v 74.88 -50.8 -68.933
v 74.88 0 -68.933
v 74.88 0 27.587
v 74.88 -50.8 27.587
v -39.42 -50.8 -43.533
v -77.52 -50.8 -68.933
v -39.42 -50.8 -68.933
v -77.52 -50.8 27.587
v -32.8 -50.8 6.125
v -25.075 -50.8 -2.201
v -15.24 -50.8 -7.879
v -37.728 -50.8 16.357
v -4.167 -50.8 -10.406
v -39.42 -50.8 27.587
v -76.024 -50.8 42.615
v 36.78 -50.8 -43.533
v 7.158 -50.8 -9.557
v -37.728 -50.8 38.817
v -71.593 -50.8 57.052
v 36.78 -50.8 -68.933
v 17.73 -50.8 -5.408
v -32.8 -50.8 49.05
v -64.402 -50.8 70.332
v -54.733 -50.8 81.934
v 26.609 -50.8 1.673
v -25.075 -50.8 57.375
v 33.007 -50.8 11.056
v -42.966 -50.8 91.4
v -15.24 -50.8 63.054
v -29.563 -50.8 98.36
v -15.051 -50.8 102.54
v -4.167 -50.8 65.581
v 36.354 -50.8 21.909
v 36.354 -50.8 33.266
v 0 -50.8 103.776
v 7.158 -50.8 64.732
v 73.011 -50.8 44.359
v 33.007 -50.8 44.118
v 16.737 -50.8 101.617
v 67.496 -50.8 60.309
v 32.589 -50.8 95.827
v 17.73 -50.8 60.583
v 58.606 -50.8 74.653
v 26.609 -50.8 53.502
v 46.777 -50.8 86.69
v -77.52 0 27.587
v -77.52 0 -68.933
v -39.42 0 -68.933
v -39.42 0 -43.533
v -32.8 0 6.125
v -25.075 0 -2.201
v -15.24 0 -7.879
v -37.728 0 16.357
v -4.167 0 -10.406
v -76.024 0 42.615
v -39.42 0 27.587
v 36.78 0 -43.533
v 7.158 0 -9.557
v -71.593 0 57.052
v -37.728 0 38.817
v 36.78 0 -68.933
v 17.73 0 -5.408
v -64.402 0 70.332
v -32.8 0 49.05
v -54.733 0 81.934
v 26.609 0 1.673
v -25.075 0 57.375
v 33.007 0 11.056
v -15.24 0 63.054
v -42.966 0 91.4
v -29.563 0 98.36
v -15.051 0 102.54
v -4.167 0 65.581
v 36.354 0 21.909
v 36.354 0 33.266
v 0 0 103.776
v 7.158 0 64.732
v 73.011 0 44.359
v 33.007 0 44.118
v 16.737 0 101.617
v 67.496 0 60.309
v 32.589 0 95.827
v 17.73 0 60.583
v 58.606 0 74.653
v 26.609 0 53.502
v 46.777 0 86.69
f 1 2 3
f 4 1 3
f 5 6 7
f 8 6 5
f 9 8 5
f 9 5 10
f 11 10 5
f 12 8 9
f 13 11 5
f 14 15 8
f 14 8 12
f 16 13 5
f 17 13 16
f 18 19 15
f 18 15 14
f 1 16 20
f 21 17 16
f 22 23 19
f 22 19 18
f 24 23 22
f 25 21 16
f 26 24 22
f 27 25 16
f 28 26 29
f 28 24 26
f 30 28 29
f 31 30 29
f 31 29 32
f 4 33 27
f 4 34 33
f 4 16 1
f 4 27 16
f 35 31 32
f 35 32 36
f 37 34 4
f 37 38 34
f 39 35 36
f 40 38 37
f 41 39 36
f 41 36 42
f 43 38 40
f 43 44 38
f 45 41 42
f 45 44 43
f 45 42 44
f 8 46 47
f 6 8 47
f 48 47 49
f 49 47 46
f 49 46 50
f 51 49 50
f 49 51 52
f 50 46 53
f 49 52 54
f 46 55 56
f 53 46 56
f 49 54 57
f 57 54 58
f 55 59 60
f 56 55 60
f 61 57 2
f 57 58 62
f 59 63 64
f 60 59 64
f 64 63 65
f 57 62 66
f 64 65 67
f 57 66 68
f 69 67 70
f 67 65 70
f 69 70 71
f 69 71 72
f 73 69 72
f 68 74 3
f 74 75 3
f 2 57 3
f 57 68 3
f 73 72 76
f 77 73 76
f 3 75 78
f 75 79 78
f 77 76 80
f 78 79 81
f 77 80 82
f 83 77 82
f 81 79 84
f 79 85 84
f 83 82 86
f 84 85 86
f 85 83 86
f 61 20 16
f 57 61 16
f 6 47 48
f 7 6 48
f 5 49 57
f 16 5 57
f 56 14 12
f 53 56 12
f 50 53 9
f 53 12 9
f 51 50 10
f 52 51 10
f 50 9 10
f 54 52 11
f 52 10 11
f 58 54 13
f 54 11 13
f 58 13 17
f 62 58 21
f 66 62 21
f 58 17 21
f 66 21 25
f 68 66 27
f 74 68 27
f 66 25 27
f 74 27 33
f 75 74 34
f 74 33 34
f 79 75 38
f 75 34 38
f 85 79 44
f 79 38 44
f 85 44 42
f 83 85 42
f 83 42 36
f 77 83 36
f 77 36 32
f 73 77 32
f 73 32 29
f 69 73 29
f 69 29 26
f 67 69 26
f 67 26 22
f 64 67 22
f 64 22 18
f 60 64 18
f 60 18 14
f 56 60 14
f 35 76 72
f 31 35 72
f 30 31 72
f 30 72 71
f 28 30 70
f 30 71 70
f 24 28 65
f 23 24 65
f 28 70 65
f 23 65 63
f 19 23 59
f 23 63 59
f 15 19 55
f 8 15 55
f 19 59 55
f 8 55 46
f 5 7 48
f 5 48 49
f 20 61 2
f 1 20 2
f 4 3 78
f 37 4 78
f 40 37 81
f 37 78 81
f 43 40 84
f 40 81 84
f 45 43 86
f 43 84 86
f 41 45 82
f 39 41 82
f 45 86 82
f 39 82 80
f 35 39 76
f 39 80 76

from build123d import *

# Parameters (mm, degrees)
F0_W     = 38.1
F0_H     = 25.4
F1_DEPTH = 50.8
F2_D     = 76.2


with BuildPart() as f1:
    # F0 (on Front) → F1 (new body)
    with BuildSketch(Plane.XZ):
        with BuildLine():
            ThreePointArc((0, 103.7758213215), (-54.7329493961, 81.9335598316), (-77.5202206336, 27.5872590731))
            Line((-77.5202206336, 27.5872590731), (-1.3202206336, 27.5872590731))
            Line((-1.3202206336, 27.5872590731), (0, 103.7758213215))
        make_face()
        Polygon((-1.3202206336, 27.5872590731), (-77.5202206336, 27.5872590731), (-77.5202206336, -43.5327409269), (-39.4202206336, -43.5327409269), (36.7797793664, -43.5327409269), (74.8797793664, -43.5327409269), (74.8797793664, 27.5872590731), align=None)
        with BuildLine():
            Line((0, 103.7758213215), (-1.3202206336, 27.5872590731))
            Line((-1.3202206336, 27.5872590731), (74.8797793664, 27.5872590731))
            ThreePointArc((74.8797793664, 27.5872590731), (53.026080125, 80.9999878356), (0, 103.7758213215))
        make_face()
        with Locations((-58.4702206336, -56.2327409269)):
            Rectangle(F0_W, F0_H)
        with Locations((55.8297793664, -56.2327409269)):
            Rectangle(F0_W, F0_H)
    extrude(amount=F1_DEPTH)

    # F2 (through all)
    with Locations(Plane(origin=(0, 0, 0), x_dir=(1, 0, 0), z_dir=(0, 1, 0))):
        with Locations((-1.3202206336, -27.5872590731)):
            Hole(F2_D / 2)


solid = f1.part
